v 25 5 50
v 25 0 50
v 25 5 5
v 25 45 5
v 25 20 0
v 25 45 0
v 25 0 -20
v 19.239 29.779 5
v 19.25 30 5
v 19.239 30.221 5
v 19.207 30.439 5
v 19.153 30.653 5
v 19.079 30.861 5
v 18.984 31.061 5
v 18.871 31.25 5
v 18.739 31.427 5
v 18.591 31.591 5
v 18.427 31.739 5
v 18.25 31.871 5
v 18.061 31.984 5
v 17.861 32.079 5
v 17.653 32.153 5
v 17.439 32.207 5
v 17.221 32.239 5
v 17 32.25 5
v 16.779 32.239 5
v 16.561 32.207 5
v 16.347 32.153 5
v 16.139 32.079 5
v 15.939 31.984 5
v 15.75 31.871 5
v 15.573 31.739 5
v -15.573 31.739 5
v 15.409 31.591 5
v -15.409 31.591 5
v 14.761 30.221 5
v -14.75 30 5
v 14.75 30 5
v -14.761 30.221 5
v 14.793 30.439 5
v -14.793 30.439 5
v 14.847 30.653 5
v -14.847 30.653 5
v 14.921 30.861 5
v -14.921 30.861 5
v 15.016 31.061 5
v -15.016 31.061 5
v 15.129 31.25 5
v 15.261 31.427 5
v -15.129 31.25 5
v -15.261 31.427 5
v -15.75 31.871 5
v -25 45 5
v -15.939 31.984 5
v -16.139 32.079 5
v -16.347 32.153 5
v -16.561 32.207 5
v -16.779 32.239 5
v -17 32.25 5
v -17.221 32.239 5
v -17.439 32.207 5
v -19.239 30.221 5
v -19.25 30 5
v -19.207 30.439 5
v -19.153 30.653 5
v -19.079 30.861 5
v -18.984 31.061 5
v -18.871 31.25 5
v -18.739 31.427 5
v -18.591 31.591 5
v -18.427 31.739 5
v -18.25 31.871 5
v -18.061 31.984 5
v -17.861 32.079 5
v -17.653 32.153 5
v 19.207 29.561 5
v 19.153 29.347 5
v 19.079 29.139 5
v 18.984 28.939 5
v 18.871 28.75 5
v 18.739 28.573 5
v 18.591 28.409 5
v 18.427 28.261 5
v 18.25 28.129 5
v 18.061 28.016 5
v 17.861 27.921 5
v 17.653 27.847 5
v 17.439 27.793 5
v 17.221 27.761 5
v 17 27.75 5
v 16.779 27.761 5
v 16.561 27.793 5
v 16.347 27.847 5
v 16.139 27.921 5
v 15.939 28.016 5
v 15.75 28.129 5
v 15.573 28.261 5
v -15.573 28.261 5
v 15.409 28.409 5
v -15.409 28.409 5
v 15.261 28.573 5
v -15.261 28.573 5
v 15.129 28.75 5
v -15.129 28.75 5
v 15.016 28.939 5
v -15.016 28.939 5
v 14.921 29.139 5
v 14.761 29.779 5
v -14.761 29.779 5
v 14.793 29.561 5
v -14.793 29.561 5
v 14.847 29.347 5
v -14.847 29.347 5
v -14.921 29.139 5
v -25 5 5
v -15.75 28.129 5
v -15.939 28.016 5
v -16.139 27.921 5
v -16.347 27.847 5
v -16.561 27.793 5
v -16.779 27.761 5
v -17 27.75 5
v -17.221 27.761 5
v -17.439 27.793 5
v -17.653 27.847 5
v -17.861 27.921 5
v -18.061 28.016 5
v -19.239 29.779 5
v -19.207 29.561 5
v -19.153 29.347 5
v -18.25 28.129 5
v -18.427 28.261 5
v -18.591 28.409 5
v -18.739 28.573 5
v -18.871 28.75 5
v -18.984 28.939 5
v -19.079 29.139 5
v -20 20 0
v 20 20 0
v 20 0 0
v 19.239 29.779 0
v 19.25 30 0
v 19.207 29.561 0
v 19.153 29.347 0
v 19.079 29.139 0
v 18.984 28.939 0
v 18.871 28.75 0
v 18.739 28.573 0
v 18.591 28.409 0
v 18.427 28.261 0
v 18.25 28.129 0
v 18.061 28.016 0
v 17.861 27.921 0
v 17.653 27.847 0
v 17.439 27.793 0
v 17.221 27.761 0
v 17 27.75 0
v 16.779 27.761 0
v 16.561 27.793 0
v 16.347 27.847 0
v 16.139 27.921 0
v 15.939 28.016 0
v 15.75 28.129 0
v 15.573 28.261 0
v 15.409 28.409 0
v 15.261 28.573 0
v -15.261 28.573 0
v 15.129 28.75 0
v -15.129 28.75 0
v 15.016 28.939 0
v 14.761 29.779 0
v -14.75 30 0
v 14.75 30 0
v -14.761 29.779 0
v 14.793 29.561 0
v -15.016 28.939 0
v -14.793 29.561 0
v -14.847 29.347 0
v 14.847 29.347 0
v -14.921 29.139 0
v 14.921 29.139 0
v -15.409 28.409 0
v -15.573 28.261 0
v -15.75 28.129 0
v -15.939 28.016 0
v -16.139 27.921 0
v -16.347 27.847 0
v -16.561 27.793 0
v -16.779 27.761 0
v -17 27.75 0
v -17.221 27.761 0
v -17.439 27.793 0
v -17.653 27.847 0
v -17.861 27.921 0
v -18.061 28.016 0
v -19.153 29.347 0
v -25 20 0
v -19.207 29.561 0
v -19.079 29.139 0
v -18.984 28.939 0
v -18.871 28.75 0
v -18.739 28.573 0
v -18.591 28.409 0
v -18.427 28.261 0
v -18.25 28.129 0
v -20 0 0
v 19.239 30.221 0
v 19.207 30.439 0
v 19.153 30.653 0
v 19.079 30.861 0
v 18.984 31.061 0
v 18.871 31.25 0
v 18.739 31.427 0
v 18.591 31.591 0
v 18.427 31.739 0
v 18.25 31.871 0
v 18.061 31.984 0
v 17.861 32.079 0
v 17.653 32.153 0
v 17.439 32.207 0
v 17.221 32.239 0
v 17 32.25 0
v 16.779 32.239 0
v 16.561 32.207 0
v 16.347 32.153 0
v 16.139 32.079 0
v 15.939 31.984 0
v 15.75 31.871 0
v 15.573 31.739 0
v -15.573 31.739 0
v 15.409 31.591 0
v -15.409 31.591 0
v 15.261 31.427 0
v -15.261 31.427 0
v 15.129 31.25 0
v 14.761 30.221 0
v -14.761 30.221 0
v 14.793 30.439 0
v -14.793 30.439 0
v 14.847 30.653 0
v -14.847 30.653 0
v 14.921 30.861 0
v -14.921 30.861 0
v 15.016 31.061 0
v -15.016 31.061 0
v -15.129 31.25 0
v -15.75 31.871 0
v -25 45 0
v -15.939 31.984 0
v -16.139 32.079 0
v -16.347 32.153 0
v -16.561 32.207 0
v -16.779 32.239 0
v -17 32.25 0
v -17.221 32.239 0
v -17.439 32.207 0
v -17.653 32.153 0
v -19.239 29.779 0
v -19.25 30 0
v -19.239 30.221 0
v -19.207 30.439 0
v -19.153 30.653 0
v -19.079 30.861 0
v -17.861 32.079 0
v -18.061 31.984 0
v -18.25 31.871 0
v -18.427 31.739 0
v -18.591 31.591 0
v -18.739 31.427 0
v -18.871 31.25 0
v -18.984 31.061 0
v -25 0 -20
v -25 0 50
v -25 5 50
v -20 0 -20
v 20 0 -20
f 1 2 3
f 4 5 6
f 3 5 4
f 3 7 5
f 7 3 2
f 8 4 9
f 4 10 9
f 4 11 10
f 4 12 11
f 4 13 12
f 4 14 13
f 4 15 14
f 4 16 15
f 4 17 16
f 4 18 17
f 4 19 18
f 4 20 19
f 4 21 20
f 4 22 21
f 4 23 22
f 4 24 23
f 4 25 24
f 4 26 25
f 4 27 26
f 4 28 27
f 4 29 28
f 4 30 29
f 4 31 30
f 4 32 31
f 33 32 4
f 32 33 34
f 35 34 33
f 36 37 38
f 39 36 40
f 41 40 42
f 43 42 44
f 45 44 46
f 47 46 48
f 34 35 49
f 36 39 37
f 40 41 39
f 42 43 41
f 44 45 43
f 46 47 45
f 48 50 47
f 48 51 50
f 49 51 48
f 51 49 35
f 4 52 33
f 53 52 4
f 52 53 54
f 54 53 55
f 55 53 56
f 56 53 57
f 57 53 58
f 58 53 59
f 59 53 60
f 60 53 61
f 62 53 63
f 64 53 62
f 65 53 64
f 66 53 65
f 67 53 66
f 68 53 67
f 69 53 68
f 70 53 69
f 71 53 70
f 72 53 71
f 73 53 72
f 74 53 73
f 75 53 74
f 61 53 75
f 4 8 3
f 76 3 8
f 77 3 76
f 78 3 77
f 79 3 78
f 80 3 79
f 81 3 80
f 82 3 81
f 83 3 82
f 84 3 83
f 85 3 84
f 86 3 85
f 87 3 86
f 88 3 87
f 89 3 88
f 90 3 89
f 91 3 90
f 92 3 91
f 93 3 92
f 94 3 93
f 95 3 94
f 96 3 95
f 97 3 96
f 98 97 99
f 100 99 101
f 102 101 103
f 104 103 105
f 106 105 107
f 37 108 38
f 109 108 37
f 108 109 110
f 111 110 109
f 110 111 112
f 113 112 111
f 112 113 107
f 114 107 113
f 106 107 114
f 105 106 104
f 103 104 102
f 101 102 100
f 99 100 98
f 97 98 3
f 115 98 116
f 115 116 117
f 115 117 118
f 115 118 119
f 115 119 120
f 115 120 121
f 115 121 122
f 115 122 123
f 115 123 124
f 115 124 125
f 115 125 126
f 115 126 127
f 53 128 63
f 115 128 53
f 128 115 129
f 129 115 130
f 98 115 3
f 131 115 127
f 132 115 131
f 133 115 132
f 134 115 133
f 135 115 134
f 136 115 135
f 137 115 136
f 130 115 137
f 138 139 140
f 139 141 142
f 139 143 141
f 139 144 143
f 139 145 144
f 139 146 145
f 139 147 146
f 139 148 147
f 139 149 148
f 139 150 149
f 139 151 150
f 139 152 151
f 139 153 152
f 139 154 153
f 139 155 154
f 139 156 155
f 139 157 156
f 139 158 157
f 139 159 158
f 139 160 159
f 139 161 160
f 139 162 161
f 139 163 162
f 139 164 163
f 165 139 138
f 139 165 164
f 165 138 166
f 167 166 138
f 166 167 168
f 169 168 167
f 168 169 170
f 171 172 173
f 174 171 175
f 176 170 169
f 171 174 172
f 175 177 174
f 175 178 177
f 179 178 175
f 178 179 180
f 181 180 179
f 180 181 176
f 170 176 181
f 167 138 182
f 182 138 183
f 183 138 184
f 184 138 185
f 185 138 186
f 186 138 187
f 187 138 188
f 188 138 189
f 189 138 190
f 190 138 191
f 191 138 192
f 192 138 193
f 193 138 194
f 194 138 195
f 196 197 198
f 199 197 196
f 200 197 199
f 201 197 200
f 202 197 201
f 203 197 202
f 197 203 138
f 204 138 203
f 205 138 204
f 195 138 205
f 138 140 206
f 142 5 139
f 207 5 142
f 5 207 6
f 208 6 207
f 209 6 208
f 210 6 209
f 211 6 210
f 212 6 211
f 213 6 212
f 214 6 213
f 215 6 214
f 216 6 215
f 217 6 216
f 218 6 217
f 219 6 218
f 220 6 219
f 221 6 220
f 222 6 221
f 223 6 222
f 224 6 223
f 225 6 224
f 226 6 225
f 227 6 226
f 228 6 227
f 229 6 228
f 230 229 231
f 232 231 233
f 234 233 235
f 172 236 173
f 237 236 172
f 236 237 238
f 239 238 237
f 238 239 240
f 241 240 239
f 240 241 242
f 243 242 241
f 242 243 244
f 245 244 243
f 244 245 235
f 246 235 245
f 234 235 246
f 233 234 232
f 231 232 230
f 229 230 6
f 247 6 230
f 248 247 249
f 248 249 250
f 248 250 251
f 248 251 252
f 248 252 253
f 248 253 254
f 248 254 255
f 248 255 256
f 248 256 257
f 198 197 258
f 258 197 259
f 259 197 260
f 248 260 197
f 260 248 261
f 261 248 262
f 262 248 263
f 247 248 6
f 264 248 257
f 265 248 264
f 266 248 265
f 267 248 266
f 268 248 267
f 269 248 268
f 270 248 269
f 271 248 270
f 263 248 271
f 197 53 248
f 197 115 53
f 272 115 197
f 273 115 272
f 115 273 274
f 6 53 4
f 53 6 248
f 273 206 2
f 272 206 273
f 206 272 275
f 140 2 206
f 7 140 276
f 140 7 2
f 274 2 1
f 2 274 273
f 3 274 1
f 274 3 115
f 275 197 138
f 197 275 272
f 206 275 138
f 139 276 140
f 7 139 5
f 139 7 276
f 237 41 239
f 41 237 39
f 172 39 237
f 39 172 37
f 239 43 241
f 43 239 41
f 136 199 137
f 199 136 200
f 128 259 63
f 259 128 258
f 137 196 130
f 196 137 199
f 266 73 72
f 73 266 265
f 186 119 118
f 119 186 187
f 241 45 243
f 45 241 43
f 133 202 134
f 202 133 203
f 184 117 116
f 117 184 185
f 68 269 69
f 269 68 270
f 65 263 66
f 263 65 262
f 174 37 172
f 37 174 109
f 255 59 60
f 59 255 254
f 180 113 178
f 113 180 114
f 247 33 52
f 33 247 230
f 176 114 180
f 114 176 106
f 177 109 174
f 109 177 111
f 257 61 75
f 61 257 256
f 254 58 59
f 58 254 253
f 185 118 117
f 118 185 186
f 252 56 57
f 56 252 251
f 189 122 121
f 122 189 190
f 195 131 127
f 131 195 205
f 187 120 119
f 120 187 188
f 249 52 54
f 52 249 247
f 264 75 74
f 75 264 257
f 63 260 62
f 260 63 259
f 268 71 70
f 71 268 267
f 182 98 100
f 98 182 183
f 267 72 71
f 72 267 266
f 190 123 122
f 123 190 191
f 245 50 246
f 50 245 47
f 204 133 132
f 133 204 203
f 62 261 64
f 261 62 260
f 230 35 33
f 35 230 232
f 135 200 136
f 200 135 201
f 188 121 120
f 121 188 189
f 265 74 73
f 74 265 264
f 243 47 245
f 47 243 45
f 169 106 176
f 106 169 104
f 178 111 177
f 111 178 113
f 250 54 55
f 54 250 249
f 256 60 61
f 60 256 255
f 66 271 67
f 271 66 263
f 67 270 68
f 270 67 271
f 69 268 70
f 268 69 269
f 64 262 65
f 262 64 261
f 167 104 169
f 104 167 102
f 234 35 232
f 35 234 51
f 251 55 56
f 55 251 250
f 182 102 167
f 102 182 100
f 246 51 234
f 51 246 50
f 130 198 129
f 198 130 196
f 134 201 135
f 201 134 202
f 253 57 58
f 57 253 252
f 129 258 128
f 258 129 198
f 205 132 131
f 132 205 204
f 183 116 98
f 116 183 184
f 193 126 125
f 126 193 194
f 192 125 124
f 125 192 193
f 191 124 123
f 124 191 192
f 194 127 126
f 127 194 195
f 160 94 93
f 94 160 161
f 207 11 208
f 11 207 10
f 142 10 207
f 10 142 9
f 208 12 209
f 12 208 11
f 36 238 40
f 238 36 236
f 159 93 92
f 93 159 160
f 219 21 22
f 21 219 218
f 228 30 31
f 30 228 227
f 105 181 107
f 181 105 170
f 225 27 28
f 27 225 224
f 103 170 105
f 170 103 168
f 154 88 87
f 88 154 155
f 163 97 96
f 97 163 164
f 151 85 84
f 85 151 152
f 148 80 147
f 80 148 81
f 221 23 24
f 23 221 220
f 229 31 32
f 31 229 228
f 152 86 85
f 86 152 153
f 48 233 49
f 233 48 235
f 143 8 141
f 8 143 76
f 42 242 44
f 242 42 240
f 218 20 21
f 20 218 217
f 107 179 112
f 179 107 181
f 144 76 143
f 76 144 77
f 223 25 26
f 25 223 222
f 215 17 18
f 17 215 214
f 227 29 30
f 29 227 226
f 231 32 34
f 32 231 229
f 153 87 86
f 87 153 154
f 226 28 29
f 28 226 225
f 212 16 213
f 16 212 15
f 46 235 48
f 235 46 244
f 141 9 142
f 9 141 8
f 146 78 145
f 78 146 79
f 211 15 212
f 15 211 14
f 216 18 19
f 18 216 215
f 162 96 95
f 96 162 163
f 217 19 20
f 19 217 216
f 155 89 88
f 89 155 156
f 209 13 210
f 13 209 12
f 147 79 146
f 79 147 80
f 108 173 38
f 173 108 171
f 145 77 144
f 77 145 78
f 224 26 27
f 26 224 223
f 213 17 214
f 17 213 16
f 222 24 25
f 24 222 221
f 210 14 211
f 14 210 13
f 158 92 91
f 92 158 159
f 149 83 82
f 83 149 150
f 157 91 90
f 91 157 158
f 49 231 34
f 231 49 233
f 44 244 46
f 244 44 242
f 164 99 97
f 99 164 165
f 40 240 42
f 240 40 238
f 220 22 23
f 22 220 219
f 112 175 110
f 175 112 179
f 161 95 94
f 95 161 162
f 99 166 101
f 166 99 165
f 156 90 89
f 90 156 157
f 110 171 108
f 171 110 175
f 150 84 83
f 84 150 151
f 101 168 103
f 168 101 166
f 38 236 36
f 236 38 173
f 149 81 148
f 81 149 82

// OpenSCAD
// L-shaped NEMA 17 stepper motor mounting bracket
// Print orientation: base plate on bed (z=0), builds upward (+Z)

// Base plate dimensions
base_x_min = -25;
base_x_max = 25;
base_y_min = 0;
base_y_max = 45;
base_z_min = 0;
base_z_max = 5;

// Vertical motor plate dimensions
plate_x_min = -25;
plate_x_max = 25;
plate_y_min = 0;
plate_y_max = 5;
plate_z_min = 0;
plate_z_max = 50;

// Base plate M4 through-holes (vertical, along Z)
m4_hole_dia = 4.5;
m4_hole1_x = -17;
m4_hole1_y = 30;
m4_hole2_x = 17;
m4_hole2_y = 30;

// Motor plate centring boss hole (along Y)
boss_hole_dia = 23;
boss_hole_x = 0;
boss_hole_z = 28;

// Motor plate M3 screw holes (along Y)
m3_hole_dia = 3.4;
m3_pattern_size = 31;  // square pattern centred on boss hole
m3_hole_offset = m3_pattern_size / 2;  // 15.5 mm from centre

// Gusset dimensions
gusset_thickness = 5;
gusset_leg_y = 20;  // leg along +Y
gusset_leg_z = 20;  // leg along +Z
gusset_corner_y = 5;  // right-angle corner y position
gusset_corner_z = 5;  // right-angle corner z position

// Left gusset x range
gusset_left_x_min = -25;
gusset_left_x_max = -20;

// Right gusset x range
gusset_right_x_min = 20;
gusset_right_x_max = 25;

$fn = 64;

// Base plate
module base_plate() { translate([base_x_min, base_y_min, base_z_min])
    cube([base_x_max - base_x_min, base_y_max - base_y_min, base_z_max - base_z_min]); }

// Vertical motor plate
module motor_plate() { translate([plate_x_min, plate_y_min, plate_z_min])
    cube([plate_x_max - plate_x_min, plate_y_max - plate_y_min, plate_z_max - plate_z_min]); }

// M4 holes in base plate (vertical through-holes, along Z)
module m4_hole1() { translate([m4_hole1_x, m4_hole1_y, -1])
    cylinder(h = base_z_max - base_z_min + 2, d = m4_hole_dia); }

module m4_hole2() { translate([m4_hole2_x, m4_hole2_y, -1])
    cylinder(h = base_z_max - base_z_min + 2, d = m4_hole_dia); }

// Boss hole in motor plate (along Y)
module boss_hole() { translate([boss_hole_x, -1, boss_hole_z])
    rotate([90, 0, 0])
    cylinder(h = plate_y_max - plate_y_min + 2, d = boss_hole_dia); }

// M3 screw holes in motor plate (along Y)
module m3_hole1() { translate([boss_hole_x - m3_hole_offset, -1, boss_hole_z - m3_hole_offset])
    rotate([90, 0, 0])
    cylinder(h = plate_y_max - plate_y_min + 2, d = m3_hole_dia); }

module m3_hole2() { translate([boss_hole_x + m3_hole_offset, -1, boss_hole_z - m3_hole_offset])
    rotate([90, 0, 0])
    cylinder(h = plate_y_max - plate_y_min + 2, d = m3_hole_dia); }

module m3_hole3() { translate([boss_hole_x - m3_hole_offset, -1, boss_hole_z + m3_hole_offset])
    rotate([90, 0, 0])
    cylinder(h = plate_y_max - plate_y_min + 2, d = m3_hole_dia); }

module m3_hole4() { translate([boss_hole_x + m3_hole_offset, -1, boss_hole_z + m3_hole_offset])
    rotate([90, 0, 0])
    cylinder(h = plate_y_max - plate_y_min + 2, d = m3_hole_dia); }

// Left gusset: right triangle in YZ plane, extruded along X
// Define triangle in XY plane, rotate to YZ, then extrude along X
module left_gusset() {
    translate([gusset_left_x_min, 0, 0])
    rotate([0, 90, 0])  // Rotate XY plane to YZ plane
    linear_extrude(height = gusset_left_x_max - gusset_left_x_min)
    polygon(points = [[0, 0],
                       [gusset_leg_y, 0],
                       [0, gusset_leg_z]]);
}

// Right gusset: right triangle in YZ plane, extruded along X
module right_gusset() {
    translate([gusset_right_x_min, 0, 0])
    rotate([0, 90, 0])  // Rotate XY plane to YZ plane
    linear_extrude(height = gusset_right_x_max - gusset_right_x_min)
    polygon(points = [[0, 0],
                       [gusset_leg_y, 0],
                       [0, gusset_leg_z]]);
}

// Assemble the bracket
difference() {
    union() {
        base_plate();
        motor_plate();
        left_gusset();
        right_gusset();
    }
    // Cut M4 holes from base plate
    m4_hole1();
    m4_hole2();
}
